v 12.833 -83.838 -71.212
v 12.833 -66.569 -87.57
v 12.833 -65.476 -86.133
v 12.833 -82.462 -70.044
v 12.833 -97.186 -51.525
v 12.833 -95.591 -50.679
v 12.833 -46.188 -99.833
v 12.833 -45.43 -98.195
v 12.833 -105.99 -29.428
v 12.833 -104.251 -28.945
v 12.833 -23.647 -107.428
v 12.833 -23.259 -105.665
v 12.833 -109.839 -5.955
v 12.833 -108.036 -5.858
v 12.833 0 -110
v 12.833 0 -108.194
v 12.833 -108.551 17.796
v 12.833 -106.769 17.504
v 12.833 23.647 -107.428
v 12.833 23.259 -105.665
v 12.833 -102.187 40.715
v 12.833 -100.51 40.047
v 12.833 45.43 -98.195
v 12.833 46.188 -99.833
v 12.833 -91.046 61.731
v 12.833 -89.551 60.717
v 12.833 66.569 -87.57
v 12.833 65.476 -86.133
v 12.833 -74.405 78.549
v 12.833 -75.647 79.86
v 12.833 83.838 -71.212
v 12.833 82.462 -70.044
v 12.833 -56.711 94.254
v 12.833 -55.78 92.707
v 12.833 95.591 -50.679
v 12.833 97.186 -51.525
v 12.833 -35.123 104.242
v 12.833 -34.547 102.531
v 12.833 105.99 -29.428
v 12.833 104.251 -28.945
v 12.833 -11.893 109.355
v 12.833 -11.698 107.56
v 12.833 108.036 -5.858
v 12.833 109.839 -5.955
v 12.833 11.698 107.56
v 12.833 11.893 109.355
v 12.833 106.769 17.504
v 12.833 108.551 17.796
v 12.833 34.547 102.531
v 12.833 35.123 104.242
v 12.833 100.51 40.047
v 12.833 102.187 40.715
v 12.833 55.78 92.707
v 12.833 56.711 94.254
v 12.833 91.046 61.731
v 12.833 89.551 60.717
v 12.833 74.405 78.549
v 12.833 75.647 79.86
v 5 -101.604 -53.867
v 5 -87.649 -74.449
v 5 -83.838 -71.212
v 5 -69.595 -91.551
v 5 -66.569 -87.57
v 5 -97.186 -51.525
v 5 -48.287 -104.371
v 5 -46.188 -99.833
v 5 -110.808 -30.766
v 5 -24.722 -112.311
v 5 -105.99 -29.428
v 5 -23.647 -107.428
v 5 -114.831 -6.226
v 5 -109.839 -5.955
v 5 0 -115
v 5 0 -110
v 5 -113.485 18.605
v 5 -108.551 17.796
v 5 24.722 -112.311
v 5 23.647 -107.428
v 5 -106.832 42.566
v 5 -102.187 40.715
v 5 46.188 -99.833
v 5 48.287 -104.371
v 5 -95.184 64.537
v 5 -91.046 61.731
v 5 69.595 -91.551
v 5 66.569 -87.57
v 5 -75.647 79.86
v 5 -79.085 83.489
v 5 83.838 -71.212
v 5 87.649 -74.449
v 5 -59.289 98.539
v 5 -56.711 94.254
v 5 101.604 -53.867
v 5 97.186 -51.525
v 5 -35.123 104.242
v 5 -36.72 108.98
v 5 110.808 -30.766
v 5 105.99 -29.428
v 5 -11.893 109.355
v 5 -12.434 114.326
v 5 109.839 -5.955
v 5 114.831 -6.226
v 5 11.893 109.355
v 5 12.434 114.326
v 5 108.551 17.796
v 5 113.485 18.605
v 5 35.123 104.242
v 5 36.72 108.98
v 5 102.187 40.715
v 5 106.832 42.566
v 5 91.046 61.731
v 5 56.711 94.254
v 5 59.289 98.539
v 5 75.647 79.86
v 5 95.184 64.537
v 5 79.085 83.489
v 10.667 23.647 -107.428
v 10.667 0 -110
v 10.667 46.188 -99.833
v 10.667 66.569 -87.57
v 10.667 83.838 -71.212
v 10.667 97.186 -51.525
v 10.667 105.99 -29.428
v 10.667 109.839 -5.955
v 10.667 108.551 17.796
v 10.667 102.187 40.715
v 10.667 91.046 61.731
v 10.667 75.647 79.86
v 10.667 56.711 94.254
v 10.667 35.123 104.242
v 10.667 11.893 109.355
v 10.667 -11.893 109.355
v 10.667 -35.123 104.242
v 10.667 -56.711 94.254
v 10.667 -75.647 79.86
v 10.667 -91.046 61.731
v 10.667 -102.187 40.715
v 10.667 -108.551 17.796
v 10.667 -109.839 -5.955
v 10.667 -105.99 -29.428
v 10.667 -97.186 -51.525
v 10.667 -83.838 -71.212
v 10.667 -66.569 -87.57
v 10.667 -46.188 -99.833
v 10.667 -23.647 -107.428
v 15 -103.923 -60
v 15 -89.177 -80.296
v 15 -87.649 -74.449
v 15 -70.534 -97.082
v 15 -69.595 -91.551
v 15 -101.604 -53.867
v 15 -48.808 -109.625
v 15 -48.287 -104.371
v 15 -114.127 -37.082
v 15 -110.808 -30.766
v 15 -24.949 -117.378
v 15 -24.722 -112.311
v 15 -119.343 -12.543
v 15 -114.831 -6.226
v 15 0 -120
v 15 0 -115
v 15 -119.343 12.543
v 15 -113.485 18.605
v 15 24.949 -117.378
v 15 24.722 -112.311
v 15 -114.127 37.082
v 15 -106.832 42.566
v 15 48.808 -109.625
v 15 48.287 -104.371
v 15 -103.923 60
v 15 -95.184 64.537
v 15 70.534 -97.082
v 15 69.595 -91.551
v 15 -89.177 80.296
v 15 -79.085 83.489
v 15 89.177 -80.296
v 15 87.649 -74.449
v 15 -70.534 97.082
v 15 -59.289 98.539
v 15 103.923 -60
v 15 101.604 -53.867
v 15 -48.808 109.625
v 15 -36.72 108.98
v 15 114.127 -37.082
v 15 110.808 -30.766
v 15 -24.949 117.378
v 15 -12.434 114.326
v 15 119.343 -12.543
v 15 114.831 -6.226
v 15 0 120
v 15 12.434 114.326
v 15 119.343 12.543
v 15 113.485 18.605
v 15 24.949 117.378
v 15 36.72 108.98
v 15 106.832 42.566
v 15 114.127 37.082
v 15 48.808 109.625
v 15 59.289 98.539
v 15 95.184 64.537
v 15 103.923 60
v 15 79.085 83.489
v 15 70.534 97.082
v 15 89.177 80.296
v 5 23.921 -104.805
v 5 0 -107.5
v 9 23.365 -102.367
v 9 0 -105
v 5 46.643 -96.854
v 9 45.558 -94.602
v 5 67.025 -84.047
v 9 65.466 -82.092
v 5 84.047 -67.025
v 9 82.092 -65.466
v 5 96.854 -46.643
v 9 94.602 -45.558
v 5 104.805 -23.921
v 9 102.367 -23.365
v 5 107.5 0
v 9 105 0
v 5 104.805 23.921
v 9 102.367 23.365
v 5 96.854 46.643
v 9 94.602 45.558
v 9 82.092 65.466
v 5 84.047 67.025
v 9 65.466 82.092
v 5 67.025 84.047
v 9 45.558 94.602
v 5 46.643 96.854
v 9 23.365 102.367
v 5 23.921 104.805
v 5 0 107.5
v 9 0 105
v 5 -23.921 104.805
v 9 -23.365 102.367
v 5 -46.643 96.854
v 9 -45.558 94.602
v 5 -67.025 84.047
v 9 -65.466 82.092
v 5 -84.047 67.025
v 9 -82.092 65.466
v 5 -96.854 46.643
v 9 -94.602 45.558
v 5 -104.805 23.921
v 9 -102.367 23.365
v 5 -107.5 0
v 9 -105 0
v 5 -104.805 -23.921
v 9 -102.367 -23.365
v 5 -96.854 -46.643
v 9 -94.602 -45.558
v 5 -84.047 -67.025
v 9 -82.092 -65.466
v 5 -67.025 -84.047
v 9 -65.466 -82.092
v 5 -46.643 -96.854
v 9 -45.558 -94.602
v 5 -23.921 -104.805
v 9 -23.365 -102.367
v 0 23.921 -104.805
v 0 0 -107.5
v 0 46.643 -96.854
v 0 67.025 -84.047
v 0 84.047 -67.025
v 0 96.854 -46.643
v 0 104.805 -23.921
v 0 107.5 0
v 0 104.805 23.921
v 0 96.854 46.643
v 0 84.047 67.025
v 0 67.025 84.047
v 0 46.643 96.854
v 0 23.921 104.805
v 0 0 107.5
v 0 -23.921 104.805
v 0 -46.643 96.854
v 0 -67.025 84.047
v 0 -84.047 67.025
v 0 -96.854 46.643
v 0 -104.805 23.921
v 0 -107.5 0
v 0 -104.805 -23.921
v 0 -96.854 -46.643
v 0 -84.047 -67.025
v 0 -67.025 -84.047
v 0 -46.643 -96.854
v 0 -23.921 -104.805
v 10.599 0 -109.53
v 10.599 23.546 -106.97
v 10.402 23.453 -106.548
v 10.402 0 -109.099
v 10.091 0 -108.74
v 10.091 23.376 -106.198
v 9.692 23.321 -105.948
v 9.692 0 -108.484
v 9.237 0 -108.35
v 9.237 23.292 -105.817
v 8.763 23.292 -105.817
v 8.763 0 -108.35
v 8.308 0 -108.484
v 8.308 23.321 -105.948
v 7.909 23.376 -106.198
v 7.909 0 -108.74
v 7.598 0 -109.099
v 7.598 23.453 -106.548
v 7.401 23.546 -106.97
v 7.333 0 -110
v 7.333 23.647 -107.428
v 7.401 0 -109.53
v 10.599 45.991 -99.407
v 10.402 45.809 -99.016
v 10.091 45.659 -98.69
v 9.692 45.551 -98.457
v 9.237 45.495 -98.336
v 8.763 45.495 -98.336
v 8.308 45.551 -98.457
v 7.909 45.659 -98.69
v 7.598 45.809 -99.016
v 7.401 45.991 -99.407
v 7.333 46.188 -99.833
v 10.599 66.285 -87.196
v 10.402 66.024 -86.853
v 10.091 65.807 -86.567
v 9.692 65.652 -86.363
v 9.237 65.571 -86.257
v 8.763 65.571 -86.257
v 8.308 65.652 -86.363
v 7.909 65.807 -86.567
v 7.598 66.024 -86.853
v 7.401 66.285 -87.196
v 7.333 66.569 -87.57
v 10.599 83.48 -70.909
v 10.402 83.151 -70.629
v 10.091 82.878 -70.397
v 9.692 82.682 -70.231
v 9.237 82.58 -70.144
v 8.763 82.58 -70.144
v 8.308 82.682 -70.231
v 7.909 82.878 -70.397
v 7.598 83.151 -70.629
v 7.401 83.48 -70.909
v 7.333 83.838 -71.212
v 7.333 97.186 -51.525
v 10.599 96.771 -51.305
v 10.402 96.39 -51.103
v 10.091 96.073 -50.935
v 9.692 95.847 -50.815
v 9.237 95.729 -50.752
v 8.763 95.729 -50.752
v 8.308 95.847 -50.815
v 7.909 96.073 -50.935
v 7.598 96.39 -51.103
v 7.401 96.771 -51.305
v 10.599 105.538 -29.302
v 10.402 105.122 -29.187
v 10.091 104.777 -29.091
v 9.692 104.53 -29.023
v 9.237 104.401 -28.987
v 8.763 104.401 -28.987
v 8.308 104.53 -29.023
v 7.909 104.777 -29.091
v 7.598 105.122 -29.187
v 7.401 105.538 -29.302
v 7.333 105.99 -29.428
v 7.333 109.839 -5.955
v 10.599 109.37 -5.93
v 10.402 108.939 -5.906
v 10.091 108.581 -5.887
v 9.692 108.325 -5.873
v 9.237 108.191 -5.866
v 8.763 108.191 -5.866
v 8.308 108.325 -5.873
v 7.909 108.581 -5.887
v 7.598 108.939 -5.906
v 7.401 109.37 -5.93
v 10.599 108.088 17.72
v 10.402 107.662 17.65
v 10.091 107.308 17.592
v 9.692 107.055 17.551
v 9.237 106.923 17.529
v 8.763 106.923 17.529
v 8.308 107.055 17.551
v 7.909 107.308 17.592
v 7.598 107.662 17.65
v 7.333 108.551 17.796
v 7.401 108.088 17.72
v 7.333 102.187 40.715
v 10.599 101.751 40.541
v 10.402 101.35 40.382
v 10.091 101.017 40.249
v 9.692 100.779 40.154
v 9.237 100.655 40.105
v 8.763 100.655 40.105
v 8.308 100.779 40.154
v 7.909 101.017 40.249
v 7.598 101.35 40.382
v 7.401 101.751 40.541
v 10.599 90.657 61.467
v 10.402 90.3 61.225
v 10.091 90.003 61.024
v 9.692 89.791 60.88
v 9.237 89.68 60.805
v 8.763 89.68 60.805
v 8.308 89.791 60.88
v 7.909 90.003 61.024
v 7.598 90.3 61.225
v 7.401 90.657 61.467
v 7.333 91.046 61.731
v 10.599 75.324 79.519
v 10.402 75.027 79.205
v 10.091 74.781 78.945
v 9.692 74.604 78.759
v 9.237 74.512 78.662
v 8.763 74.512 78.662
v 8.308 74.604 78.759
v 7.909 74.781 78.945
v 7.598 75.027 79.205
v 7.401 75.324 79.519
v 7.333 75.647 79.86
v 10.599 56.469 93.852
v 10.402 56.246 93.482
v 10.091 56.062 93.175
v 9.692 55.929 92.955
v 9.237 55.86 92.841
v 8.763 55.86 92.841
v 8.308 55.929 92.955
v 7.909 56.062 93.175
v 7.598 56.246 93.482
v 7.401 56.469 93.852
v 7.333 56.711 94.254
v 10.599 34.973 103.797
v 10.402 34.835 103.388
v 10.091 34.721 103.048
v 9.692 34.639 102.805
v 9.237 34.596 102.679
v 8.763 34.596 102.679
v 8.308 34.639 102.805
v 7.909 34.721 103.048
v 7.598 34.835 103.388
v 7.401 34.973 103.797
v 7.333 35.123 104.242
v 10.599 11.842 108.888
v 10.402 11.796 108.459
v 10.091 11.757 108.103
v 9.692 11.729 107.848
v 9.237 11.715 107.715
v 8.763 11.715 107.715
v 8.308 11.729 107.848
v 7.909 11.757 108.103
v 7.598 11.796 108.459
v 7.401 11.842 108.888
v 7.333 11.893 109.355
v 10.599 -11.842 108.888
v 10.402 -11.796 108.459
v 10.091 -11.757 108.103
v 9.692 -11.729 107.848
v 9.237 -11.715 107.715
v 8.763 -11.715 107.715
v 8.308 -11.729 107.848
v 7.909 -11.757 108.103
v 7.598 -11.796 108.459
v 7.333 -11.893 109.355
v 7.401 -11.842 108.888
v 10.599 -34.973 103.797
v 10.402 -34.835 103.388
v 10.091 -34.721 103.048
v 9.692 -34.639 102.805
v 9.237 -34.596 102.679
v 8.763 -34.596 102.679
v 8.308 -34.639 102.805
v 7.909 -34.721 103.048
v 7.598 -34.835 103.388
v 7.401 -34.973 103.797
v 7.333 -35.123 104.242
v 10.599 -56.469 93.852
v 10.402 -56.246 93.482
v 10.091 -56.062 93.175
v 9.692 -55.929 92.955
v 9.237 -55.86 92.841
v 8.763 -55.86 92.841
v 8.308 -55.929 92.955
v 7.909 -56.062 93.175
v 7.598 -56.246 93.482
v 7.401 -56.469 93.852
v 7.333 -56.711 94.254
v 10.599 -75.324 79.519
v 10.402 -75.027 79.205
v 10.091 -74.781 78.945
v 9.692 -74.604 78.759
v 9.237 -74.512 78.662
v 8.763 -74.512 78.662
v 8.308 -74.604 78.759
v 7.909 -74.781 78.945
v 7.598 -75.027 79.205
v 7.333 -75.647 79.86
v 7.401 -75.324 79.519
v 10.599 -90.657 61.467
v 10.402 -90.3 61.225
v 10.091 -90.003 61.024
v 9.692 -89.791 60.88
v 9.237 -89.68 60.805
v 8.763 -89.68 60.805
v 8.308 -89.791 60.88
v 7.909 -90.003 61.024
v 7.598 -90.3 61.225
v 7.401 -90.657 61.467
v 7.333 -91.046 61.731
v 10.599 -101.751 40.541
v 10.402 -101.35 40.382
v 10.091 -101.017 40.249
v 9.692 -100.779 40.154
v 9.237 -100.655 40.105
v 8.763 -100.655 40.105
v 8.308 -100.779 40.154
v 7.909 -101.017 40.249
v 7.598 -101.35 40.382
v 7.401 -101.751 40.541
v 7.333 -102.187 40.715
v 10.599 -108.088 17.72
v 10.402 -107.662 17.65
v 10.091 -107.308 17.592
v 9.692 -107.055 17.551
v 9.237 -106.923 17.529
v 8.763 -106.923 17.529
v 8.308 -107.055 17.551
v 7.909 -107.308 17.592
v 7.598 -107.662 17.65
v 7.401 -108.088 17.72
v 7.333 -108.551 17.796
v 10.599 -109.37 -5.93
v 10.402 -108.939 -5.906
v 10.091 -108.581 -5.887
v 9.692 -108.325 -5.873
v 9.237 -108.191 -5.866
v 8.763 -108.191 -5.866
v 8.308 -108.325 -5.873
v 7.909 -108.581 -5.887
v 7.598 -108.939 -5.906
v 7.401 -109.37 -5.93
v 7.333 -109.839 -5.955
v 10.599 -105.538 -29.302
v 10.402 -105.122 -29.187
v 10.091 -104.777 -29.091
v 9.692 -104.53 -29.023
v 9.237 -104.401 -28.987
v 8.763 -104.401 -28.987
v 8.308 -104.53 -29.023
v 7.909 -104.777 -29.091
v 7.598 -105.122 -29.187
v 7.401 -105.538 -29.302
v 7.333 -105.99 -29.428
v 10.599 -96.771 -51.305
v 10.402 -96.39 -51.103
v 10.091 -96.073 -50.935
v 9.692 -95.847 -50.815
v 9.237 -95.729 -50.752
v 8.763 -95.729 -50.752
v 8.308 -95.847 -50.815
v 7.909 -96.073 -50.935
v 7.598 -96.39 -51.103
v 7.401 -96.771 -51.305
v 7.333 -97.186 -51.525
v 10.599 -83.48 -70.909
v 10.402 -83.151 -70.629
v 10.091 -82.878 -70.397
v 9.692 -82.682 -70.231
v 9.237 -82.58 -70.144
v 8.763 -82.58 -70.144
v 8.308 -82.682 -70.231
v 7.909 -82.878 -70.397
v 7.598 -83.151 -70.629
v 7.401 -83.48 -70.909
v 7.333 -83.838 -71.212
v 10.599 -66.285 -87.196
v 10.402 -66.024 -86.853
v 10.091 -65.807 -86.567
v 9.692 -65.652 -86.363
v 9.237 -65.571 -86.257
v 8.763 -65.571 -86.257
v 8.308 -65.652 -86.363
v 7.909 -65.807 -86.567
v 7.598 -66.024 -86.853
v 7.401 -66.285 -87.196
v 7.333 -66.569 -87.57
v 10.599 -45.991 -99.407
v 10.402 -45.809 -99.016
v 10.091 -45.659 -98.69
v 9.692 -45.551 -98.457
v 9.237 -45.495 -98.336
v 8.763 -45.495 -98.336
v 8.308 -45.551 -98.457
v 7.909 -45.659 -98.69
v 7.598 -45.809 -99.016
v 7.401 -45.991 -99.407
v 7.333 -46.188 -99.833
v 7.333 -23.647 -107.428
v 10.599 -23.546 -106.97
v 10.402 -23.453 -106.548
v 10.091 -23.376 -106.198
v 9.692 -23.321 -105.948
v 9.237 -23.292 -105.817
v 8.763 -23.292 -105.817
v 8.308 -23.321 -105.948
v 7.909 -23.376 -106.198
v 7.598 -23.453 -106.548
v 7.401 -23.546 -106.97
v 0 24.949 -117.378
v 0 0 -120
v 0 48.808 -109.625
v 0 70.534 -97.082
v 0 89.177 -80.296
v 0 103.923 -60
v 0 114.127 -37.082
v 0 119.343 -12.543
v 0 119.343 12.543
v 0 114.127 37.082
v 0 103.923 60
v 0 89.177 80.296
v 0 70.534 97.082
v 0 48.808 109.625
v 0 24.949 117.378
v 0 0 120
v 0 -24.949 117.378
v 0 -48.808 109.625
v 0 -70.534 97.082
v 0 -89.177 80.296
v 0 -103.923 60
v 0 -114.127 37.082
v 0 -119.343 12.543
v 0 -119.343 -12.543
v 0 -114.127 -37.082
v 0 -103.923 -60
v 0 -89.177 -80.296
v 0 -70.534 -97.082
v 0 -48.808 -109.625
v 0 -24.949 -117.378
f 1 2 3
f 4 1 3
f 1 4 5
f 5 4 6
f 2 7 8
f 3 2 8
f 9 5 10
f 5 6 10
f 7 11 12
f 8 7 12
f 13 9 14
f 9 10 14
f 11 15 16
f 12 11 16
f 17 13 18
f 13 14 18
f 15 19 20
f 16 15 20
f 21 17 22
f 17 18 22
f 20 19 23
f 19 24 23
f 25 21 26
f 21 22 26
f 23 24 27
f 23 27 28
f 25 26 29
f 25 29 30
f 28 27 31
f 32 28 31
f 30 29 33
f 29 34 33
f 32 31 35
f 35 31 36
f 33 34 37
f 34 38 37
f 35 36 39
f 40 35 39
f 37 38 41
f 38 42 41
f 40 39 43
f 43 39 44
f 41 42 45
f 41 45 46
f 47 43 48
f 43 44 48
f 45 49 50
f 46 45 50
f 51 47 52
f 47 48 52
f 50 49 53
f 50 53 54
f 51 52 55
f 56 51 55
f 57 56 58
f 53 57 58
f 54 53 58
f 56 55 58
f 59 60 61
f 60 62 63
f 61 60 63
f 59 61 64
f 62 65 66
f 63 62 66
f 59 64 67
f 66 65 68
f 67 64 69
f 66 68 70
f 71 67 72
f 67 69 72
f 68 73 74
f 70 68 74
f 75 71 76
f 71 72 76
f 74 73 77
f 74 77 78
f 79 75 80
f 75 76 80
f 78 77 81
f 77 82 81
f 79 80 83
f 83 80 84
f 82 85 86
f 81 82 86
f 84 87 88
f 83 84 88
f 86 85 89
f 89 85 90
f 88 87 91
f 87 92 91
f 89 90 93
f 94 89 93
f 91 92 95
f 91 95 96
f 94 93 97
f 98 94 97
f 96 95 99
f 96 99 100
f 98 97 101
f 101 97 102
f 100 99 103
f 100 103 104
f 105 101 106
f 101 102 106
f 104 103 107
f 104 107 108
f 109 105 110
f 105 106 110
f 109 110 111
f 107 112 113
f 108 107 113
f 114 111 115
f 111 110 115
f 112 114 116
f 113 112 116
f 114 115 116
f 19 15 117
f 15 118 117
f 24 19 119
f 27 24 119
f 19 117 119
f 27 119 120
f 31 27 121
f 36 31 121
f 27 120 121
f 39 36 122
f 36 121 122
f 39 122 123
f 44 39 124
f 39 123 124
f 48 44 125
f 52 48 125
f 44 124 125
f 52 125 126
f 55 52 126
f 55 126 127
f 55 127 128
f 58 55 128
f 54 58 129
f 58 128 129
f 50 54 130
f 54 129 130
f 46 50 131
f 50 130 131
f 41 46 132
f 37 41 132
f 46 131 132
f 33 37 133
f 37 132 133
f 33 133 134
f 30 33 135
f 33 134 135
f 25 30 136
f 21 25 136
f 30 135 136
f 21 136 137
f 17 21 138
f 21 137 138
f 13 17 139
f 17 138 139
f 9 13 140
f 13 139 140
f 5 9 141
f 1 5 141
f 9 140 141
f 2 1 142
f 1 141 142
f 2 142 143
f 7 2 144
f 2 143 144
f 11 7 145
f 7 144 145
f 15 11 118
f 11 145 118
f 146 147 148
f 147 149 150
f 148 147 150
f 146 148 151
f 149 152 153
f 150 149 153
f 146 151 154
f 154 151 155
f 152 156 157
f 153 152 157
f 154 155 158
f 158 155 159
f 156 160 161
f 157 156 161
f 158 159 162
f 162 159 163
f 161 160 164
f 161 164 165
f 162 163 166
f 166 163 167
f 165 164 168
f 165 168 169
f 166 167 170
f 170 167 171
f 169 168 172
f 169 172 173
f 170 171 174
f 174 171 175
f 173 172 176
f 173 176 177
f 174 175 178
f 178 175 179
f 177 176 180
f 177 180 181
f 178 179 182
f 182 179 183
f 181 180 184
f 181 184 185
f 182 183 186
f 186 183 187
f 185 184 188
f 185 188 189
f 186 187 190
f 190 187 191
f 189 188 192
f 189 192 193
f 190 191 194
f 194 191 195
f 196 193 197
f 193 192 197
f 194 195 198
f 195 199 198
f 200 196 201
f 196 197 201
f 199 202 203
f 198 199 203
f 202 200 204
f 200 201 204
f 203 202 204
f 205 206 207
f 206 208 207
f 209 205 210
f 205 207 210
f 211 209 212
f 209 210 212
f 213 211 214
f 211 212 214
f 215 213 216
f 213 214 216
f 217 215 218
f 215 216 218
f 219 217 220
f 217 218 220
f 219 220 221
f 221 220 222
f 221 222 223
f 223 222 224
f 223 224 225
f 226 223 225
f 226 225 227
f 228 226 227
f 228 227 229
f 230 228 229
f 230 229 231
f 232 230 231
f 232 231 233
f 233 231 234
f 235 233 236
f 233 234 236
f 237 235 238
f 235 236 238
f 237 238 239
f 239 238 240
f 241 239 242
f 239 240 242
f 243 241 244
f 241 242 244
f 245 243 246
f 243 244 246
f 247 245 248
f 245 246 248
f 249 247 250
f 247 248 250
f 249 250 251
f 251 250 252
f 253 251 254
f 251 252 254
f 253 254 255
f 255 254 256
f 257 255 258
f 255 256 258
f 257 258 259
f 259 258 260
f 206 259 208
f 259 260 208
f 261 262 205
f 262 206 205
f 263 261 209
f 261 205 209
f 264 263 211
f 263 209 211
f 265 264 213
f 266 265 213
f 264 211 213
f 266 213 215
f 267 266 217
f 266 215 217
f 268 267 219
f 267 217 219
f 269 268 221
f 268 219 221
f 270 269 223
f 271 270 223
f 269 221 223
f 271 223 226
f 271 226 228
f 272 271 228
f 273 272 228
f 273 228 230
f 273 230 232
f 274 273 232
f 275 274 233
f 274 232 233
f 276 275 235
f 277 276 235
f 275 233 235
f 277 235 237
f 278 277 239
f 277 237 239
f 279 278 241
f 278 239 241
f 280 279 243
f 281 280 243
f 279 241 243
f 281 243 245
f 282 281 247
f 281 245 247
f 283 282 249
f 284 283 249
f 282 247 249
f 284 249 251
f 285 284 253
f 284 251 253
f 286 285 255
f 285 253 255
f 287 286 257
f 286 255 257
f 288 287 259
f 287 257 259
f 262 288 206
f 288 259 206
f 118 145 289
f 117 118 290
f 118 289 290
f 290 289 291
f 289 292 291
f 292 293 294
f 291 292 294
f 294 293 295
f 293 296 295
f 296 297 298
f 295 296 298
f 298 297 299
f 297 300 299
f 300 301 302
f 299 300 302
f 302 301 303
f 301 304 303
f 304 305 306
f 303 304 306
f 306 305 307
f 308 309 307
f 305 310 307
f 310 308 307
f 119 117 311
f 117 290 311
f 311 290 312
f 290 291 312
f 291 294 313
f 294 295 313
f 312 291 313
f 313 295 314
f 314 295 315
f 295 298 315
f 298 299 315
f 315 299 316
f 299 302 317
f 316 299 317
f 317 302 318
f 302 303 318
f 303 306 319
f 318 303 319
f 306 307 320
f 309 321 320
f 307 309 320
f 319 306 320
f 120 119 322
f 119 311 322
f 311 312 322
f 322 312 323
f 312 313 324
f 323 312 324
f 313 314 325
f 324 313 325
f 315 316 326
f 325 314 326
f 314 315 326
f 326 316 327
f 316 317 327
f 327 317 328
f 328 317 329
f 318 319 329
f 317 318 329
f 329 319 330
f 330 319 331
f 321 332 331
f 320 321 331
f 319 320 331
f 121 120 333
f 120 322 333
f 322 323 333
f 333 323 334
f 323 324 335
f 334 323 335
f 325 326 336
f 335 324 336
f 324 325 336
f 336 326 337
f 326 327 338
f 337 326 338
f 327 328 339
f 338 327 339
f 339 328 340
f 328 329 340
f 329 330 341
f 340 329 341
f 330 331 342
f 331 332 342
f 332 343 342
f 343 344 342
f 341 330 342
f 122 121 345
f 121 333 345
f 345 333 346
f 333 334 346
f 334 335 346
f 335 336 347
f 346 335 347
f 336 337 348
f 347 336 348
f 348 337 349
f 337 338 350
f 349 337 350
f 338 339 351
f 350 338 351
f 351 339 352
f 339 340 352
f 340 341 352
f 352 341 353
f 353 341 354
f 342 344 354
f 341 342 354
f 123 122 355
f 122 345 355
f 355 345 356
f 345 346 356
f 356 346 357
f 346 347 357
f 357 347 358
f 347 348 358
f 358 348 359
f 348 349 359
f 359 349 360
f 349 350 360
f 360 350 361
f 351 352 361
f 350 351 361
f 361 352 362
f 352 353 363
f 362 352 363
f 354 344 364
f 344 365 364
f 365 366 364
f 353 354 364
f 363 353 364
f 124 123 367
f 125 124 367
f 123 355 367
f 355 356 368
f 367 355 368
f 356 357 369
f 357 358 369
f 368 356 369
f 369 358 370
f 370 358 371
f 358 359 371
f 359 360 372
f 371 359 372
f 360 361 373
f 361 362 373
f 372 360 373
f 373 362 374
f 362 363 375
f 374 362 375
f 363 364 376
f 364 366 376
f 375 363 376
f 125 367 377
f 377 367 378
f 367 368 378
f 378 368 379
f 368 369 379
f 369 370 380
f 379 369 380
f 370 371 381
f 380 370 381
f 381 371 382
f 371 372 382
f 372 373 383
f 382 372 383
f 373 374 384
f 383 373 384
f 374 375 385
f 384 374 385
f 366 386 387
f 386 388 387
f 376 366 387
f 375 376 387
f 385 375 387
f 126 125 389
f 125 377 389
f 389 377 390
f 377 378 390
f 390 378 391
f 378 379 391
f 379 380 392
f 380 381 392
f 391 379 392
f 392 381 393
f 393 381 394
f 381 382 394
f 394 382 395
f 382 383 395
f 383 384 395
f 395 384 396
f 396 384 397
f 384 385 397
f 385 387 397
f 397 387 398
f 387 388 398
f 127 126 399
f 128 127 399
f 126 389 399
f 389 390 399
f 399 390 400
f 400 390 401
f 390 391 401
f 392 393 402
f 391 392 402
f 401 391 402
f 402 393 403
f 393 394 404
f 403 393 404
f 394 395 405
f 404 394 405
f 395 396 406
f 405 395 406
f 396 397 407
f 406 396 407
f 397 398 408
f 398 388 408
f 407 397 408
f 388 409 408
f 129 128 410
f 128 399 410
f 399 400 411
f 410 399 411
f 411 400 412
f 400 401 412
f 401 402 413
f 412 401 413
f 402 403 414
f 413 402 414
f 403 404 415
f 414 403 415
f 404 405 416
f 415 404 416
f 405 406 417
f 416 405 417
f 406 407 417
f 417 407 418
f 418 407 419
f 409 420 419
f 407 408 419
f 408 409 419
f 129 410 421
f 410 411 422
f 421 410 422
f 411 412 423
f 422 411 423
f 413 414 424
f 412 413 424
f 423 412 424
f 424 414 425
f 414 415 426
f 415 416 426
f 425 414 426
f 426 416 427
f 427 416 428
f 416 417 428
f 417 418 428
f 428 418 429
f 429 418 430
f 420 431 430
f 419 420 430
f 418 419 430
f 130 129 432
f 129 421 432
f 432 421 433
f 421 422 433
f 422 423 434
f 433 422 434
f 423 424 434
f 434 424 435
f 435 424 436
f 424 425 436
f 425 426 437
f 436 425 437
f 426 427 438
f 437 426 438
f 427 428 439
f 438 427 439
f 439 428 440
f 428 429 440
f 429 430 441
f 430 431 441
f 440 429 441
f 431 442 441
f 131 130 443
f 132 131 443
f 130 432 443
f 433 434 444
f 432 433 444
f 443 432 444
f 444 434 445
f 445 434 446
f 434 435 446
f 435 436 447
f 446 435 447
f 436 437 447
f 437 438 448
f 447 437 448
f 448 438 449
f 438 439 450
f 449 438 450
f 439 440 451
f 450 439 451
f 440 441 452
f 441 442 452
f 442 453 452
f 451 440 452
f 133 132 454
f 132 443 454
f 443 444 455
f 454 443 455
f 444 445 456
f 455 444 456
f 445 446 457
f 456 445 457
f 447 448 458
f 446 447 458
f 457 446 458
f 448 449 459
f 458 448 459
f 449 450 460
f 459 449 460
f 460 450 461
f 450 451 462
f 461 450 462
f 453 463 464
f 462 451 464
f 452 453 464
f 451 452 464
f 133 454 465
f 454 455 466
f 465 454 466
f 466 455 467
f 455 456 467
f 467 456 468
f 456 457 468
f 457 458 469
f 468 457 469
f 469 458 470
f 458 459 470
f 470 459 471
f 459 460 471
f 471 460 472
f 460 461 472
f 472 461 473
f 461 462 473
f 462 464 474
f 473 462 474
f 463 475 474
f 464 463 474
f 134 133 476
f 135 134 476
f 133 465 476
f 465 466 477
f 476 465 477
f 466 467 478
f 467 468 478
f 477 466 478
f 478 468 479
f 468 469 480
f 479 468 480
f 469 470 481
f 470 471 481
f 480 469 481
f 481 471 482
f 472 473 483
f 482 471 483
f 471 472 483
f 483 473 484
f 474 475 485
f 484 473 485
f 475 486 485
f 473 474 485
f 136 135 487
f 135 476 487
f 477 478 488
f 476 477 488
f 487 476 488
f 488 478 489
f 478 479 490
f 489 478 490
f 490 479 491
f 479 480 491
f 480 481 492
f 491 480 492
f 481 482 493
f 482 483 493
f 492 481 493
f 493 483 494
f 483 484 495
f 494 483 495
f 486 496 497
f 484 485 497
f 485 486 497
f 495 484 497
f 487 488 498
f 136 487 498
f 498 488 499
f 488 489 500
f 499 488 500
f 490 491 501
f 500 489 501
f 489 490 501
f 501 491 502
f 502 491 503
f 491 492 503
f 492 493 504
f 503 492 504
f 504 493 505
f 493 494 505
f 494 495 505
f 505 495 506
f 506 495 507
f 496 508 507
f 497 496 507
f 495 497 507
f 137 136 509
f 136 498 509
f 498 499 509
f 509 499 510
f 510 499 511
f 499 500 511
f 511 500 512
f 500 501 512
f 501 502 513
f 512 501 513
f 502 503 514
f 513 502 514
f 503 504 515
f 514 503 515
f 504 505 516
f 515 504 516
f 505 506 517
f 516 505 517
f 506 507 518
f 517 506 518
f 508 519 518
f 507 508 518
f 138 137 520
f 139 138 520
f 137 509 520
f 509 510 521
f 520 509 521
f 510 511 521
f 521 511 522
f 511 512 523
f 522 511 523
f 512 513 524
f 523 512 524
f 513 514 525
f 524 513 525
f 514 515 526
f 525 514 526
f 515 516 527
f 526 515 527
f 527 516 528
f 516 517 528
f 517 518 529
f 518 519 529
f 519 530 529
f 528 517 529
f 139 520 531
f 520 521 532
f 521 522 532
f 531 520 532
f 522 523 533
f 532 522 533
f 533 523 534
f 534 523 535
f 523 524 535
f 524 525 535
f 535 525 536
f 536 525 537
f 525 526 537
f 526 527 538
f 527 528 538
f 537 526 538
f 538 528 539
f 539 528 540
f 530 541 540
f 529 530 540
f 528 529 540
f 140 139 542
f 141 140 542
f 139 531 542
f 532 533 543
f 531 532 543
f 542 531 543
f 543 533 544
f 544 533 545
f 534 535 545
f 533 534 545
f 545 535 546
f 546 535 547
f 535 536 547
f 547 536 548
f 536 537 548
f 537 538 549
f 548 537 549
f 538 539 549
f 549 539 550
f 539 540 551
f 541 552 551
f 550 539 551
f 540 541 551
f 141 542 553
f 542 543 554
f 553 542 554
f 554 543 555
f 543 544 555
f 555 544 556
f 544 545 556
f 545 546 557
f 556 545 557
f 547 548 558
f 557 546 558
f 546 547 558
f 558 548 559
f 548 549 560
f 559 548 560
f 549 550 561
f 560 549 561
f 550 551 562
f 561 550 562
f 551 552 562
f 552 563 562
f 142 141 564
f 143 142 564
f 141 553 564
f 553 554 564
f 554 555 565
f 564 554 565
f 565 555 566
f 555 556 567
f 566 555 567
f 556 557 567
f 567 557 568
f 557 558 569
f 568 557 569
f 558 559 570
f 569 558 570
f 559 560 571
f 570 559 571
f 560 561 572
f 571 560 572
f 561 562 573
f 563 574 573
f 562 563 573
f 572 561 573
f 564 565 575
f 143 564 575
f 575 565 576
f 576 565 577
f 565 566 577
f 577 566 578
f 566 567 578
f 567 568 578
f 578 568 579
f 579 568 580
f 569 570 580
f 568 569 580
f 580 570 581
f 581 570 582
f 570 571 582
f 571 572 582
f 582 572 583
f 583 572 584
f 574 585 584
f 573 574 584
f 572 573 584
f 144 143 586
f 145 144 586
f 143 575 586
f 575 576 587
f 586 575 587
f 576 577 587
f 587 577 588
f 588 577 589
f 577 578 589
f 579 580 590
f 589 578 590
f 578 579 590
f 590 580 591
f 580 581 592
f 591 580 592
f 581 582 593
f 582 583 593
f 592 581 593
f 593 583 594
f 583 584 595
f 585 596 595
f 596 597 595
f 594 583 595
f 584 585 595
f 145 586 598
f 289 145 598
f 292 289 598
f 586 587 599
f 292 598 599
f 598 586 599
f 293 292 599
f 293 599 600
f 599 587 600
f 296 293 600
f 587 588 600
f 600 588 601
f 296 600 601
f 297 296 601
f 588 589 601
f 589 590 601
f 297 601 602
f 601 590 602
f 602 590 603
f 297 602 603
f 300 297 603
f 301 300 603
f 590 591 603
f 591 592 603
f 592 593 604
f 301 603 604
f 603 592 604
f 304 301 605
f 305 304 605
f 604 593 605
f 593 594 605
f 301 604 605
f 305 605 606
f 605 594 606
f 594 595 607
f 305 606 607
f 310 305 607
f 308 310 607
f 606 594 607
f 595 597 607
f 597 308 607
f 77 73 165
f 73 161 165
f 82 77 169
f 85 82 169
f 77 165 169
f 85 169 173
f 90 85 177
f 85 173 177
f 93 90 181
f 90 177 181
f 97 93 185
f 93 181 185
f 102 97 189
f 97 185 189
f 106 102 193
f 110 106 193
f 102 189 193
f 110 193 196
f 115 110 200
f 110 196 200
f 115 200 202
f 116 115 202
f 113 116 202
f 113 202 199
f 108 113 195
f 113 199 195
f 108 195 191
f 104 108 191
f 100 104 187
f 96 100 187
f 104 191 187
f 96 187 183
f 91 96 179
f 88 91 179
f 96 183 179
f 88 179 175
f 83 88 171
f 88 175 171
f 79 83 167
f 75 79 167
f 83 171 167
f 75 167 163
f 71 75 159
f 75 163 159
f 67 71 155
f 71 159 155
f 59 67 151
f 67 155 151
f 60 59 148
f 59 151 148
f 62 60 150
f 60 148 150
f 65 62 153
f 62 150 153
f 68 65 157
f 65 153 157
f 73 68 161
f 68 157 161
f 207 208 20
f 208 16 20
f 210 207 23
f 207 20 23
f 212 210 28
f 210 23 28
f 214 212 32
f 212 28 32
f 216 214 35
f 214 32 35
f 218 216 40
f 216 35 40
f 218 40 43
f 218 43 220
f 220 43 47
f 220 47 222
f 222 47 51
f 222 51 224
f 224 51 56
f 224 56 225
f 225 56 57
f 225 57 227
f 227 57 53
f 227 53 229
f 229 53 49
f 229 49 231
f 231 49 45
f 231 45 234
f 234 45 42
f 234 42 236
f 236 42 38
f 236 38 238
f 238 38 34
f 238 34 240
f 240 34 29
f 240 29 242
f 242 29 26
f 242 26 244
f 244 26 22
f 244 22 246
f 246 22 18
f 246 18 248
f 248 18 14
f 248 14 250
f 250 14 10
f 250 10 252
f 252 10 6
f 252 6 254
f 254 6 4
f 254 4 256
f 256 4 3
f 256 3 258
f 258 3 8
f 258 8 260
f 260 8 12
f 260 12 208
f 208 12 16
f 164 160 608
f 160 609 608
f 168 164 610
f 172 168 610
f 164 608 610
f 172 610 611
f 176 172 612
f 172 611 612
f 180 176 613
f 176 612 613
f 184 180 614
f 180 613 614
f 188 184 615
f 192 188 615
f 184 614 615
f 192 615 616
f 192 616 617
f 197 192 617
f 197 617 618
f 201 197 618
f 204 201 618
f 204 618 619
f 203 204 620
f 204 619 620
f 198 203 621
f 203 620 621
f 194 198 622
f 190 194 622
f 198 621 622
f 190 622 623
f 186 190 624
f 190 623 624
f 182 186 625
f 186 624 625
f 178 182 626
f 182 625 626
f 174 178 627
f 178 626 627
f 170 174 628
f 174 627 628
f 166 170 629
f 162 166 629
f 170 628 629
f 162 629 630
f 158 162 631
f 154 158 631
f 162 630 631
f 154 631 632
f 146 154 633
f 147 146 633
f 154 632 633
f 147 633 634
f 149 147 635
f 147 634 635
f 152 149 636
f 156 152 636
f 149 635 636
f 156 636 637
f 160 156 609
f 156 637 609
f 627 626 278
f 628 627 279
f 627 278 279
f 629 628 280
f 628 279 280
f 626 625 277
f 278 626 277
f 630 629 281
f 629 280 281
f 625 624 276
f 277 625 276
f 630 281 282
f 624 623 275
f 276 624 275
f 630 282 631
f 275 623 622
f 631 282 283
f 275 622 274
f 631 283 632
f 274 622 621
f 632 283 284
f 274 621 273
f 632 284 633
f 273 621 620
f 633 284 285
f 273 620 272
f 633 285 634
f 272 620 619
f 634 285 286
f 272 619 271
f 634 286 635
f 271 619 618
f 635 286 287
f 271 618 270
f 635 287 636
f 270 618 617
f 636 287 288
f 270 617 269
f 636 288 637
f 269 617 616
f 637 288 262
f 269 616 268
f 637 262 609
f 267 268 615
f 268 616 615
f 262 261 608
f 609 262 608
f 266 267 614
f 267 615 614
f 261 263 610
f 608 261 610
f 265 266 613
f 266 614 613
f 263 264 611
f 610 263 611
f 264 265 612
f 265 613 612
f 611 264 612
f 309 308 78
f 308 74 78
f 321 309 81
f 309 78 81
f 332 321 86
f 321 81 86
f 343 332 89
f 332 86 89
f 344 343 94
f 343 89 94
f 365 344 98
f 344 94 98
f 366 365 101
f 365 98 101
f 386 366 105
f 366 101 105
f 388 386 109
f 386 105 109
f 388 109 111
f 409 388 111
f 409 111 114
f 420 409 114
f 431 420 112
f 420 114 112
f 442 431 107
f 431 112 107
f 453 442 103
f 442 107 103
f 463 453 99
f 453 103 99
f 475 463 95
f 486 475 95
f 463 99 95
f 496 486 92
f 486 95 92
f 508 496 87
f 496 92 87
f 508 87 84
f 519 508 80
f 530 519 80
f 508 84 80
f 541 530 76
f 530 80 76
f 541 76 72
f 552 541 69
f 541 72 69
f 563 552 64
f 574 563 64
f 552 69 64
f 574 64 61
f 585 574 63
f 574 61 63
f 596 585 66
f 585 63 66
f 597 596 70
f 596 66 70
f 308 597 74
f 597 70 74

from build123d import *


with BuildPart() as part:
    # Sketch1 → Revolve1 (revolve)
    with BuildSketch(Plane.XY):
        with BuildLine():
            Line((15, 120), (0, 120))
            Line((0, 120), (0, 107.5))
            Line((0, 107.5), (5, 107.5))
            Line((5, 107.5), (9, 105))
            Line((9, 105), (12.8333335, 108.194444583))
            Line((12.8333335, 108.194444583), (12.8333335, 110))
            Line((12.8333335, 110), (10.666667, 110))
            ThreePointArc((10.666667, 110), (9, 108.333333), (7.333333, 110))
            Line((7.333333, 110), (5, 110))
            Line((5, 110), (5, 115))
            Line((5, 115), (15, 115))
            Line((15, 115), (15, 120))
        make_face()
    revolve(axis=Axis((-0.005, 0, 0), (1, 0, 0)))


solid = part.part
